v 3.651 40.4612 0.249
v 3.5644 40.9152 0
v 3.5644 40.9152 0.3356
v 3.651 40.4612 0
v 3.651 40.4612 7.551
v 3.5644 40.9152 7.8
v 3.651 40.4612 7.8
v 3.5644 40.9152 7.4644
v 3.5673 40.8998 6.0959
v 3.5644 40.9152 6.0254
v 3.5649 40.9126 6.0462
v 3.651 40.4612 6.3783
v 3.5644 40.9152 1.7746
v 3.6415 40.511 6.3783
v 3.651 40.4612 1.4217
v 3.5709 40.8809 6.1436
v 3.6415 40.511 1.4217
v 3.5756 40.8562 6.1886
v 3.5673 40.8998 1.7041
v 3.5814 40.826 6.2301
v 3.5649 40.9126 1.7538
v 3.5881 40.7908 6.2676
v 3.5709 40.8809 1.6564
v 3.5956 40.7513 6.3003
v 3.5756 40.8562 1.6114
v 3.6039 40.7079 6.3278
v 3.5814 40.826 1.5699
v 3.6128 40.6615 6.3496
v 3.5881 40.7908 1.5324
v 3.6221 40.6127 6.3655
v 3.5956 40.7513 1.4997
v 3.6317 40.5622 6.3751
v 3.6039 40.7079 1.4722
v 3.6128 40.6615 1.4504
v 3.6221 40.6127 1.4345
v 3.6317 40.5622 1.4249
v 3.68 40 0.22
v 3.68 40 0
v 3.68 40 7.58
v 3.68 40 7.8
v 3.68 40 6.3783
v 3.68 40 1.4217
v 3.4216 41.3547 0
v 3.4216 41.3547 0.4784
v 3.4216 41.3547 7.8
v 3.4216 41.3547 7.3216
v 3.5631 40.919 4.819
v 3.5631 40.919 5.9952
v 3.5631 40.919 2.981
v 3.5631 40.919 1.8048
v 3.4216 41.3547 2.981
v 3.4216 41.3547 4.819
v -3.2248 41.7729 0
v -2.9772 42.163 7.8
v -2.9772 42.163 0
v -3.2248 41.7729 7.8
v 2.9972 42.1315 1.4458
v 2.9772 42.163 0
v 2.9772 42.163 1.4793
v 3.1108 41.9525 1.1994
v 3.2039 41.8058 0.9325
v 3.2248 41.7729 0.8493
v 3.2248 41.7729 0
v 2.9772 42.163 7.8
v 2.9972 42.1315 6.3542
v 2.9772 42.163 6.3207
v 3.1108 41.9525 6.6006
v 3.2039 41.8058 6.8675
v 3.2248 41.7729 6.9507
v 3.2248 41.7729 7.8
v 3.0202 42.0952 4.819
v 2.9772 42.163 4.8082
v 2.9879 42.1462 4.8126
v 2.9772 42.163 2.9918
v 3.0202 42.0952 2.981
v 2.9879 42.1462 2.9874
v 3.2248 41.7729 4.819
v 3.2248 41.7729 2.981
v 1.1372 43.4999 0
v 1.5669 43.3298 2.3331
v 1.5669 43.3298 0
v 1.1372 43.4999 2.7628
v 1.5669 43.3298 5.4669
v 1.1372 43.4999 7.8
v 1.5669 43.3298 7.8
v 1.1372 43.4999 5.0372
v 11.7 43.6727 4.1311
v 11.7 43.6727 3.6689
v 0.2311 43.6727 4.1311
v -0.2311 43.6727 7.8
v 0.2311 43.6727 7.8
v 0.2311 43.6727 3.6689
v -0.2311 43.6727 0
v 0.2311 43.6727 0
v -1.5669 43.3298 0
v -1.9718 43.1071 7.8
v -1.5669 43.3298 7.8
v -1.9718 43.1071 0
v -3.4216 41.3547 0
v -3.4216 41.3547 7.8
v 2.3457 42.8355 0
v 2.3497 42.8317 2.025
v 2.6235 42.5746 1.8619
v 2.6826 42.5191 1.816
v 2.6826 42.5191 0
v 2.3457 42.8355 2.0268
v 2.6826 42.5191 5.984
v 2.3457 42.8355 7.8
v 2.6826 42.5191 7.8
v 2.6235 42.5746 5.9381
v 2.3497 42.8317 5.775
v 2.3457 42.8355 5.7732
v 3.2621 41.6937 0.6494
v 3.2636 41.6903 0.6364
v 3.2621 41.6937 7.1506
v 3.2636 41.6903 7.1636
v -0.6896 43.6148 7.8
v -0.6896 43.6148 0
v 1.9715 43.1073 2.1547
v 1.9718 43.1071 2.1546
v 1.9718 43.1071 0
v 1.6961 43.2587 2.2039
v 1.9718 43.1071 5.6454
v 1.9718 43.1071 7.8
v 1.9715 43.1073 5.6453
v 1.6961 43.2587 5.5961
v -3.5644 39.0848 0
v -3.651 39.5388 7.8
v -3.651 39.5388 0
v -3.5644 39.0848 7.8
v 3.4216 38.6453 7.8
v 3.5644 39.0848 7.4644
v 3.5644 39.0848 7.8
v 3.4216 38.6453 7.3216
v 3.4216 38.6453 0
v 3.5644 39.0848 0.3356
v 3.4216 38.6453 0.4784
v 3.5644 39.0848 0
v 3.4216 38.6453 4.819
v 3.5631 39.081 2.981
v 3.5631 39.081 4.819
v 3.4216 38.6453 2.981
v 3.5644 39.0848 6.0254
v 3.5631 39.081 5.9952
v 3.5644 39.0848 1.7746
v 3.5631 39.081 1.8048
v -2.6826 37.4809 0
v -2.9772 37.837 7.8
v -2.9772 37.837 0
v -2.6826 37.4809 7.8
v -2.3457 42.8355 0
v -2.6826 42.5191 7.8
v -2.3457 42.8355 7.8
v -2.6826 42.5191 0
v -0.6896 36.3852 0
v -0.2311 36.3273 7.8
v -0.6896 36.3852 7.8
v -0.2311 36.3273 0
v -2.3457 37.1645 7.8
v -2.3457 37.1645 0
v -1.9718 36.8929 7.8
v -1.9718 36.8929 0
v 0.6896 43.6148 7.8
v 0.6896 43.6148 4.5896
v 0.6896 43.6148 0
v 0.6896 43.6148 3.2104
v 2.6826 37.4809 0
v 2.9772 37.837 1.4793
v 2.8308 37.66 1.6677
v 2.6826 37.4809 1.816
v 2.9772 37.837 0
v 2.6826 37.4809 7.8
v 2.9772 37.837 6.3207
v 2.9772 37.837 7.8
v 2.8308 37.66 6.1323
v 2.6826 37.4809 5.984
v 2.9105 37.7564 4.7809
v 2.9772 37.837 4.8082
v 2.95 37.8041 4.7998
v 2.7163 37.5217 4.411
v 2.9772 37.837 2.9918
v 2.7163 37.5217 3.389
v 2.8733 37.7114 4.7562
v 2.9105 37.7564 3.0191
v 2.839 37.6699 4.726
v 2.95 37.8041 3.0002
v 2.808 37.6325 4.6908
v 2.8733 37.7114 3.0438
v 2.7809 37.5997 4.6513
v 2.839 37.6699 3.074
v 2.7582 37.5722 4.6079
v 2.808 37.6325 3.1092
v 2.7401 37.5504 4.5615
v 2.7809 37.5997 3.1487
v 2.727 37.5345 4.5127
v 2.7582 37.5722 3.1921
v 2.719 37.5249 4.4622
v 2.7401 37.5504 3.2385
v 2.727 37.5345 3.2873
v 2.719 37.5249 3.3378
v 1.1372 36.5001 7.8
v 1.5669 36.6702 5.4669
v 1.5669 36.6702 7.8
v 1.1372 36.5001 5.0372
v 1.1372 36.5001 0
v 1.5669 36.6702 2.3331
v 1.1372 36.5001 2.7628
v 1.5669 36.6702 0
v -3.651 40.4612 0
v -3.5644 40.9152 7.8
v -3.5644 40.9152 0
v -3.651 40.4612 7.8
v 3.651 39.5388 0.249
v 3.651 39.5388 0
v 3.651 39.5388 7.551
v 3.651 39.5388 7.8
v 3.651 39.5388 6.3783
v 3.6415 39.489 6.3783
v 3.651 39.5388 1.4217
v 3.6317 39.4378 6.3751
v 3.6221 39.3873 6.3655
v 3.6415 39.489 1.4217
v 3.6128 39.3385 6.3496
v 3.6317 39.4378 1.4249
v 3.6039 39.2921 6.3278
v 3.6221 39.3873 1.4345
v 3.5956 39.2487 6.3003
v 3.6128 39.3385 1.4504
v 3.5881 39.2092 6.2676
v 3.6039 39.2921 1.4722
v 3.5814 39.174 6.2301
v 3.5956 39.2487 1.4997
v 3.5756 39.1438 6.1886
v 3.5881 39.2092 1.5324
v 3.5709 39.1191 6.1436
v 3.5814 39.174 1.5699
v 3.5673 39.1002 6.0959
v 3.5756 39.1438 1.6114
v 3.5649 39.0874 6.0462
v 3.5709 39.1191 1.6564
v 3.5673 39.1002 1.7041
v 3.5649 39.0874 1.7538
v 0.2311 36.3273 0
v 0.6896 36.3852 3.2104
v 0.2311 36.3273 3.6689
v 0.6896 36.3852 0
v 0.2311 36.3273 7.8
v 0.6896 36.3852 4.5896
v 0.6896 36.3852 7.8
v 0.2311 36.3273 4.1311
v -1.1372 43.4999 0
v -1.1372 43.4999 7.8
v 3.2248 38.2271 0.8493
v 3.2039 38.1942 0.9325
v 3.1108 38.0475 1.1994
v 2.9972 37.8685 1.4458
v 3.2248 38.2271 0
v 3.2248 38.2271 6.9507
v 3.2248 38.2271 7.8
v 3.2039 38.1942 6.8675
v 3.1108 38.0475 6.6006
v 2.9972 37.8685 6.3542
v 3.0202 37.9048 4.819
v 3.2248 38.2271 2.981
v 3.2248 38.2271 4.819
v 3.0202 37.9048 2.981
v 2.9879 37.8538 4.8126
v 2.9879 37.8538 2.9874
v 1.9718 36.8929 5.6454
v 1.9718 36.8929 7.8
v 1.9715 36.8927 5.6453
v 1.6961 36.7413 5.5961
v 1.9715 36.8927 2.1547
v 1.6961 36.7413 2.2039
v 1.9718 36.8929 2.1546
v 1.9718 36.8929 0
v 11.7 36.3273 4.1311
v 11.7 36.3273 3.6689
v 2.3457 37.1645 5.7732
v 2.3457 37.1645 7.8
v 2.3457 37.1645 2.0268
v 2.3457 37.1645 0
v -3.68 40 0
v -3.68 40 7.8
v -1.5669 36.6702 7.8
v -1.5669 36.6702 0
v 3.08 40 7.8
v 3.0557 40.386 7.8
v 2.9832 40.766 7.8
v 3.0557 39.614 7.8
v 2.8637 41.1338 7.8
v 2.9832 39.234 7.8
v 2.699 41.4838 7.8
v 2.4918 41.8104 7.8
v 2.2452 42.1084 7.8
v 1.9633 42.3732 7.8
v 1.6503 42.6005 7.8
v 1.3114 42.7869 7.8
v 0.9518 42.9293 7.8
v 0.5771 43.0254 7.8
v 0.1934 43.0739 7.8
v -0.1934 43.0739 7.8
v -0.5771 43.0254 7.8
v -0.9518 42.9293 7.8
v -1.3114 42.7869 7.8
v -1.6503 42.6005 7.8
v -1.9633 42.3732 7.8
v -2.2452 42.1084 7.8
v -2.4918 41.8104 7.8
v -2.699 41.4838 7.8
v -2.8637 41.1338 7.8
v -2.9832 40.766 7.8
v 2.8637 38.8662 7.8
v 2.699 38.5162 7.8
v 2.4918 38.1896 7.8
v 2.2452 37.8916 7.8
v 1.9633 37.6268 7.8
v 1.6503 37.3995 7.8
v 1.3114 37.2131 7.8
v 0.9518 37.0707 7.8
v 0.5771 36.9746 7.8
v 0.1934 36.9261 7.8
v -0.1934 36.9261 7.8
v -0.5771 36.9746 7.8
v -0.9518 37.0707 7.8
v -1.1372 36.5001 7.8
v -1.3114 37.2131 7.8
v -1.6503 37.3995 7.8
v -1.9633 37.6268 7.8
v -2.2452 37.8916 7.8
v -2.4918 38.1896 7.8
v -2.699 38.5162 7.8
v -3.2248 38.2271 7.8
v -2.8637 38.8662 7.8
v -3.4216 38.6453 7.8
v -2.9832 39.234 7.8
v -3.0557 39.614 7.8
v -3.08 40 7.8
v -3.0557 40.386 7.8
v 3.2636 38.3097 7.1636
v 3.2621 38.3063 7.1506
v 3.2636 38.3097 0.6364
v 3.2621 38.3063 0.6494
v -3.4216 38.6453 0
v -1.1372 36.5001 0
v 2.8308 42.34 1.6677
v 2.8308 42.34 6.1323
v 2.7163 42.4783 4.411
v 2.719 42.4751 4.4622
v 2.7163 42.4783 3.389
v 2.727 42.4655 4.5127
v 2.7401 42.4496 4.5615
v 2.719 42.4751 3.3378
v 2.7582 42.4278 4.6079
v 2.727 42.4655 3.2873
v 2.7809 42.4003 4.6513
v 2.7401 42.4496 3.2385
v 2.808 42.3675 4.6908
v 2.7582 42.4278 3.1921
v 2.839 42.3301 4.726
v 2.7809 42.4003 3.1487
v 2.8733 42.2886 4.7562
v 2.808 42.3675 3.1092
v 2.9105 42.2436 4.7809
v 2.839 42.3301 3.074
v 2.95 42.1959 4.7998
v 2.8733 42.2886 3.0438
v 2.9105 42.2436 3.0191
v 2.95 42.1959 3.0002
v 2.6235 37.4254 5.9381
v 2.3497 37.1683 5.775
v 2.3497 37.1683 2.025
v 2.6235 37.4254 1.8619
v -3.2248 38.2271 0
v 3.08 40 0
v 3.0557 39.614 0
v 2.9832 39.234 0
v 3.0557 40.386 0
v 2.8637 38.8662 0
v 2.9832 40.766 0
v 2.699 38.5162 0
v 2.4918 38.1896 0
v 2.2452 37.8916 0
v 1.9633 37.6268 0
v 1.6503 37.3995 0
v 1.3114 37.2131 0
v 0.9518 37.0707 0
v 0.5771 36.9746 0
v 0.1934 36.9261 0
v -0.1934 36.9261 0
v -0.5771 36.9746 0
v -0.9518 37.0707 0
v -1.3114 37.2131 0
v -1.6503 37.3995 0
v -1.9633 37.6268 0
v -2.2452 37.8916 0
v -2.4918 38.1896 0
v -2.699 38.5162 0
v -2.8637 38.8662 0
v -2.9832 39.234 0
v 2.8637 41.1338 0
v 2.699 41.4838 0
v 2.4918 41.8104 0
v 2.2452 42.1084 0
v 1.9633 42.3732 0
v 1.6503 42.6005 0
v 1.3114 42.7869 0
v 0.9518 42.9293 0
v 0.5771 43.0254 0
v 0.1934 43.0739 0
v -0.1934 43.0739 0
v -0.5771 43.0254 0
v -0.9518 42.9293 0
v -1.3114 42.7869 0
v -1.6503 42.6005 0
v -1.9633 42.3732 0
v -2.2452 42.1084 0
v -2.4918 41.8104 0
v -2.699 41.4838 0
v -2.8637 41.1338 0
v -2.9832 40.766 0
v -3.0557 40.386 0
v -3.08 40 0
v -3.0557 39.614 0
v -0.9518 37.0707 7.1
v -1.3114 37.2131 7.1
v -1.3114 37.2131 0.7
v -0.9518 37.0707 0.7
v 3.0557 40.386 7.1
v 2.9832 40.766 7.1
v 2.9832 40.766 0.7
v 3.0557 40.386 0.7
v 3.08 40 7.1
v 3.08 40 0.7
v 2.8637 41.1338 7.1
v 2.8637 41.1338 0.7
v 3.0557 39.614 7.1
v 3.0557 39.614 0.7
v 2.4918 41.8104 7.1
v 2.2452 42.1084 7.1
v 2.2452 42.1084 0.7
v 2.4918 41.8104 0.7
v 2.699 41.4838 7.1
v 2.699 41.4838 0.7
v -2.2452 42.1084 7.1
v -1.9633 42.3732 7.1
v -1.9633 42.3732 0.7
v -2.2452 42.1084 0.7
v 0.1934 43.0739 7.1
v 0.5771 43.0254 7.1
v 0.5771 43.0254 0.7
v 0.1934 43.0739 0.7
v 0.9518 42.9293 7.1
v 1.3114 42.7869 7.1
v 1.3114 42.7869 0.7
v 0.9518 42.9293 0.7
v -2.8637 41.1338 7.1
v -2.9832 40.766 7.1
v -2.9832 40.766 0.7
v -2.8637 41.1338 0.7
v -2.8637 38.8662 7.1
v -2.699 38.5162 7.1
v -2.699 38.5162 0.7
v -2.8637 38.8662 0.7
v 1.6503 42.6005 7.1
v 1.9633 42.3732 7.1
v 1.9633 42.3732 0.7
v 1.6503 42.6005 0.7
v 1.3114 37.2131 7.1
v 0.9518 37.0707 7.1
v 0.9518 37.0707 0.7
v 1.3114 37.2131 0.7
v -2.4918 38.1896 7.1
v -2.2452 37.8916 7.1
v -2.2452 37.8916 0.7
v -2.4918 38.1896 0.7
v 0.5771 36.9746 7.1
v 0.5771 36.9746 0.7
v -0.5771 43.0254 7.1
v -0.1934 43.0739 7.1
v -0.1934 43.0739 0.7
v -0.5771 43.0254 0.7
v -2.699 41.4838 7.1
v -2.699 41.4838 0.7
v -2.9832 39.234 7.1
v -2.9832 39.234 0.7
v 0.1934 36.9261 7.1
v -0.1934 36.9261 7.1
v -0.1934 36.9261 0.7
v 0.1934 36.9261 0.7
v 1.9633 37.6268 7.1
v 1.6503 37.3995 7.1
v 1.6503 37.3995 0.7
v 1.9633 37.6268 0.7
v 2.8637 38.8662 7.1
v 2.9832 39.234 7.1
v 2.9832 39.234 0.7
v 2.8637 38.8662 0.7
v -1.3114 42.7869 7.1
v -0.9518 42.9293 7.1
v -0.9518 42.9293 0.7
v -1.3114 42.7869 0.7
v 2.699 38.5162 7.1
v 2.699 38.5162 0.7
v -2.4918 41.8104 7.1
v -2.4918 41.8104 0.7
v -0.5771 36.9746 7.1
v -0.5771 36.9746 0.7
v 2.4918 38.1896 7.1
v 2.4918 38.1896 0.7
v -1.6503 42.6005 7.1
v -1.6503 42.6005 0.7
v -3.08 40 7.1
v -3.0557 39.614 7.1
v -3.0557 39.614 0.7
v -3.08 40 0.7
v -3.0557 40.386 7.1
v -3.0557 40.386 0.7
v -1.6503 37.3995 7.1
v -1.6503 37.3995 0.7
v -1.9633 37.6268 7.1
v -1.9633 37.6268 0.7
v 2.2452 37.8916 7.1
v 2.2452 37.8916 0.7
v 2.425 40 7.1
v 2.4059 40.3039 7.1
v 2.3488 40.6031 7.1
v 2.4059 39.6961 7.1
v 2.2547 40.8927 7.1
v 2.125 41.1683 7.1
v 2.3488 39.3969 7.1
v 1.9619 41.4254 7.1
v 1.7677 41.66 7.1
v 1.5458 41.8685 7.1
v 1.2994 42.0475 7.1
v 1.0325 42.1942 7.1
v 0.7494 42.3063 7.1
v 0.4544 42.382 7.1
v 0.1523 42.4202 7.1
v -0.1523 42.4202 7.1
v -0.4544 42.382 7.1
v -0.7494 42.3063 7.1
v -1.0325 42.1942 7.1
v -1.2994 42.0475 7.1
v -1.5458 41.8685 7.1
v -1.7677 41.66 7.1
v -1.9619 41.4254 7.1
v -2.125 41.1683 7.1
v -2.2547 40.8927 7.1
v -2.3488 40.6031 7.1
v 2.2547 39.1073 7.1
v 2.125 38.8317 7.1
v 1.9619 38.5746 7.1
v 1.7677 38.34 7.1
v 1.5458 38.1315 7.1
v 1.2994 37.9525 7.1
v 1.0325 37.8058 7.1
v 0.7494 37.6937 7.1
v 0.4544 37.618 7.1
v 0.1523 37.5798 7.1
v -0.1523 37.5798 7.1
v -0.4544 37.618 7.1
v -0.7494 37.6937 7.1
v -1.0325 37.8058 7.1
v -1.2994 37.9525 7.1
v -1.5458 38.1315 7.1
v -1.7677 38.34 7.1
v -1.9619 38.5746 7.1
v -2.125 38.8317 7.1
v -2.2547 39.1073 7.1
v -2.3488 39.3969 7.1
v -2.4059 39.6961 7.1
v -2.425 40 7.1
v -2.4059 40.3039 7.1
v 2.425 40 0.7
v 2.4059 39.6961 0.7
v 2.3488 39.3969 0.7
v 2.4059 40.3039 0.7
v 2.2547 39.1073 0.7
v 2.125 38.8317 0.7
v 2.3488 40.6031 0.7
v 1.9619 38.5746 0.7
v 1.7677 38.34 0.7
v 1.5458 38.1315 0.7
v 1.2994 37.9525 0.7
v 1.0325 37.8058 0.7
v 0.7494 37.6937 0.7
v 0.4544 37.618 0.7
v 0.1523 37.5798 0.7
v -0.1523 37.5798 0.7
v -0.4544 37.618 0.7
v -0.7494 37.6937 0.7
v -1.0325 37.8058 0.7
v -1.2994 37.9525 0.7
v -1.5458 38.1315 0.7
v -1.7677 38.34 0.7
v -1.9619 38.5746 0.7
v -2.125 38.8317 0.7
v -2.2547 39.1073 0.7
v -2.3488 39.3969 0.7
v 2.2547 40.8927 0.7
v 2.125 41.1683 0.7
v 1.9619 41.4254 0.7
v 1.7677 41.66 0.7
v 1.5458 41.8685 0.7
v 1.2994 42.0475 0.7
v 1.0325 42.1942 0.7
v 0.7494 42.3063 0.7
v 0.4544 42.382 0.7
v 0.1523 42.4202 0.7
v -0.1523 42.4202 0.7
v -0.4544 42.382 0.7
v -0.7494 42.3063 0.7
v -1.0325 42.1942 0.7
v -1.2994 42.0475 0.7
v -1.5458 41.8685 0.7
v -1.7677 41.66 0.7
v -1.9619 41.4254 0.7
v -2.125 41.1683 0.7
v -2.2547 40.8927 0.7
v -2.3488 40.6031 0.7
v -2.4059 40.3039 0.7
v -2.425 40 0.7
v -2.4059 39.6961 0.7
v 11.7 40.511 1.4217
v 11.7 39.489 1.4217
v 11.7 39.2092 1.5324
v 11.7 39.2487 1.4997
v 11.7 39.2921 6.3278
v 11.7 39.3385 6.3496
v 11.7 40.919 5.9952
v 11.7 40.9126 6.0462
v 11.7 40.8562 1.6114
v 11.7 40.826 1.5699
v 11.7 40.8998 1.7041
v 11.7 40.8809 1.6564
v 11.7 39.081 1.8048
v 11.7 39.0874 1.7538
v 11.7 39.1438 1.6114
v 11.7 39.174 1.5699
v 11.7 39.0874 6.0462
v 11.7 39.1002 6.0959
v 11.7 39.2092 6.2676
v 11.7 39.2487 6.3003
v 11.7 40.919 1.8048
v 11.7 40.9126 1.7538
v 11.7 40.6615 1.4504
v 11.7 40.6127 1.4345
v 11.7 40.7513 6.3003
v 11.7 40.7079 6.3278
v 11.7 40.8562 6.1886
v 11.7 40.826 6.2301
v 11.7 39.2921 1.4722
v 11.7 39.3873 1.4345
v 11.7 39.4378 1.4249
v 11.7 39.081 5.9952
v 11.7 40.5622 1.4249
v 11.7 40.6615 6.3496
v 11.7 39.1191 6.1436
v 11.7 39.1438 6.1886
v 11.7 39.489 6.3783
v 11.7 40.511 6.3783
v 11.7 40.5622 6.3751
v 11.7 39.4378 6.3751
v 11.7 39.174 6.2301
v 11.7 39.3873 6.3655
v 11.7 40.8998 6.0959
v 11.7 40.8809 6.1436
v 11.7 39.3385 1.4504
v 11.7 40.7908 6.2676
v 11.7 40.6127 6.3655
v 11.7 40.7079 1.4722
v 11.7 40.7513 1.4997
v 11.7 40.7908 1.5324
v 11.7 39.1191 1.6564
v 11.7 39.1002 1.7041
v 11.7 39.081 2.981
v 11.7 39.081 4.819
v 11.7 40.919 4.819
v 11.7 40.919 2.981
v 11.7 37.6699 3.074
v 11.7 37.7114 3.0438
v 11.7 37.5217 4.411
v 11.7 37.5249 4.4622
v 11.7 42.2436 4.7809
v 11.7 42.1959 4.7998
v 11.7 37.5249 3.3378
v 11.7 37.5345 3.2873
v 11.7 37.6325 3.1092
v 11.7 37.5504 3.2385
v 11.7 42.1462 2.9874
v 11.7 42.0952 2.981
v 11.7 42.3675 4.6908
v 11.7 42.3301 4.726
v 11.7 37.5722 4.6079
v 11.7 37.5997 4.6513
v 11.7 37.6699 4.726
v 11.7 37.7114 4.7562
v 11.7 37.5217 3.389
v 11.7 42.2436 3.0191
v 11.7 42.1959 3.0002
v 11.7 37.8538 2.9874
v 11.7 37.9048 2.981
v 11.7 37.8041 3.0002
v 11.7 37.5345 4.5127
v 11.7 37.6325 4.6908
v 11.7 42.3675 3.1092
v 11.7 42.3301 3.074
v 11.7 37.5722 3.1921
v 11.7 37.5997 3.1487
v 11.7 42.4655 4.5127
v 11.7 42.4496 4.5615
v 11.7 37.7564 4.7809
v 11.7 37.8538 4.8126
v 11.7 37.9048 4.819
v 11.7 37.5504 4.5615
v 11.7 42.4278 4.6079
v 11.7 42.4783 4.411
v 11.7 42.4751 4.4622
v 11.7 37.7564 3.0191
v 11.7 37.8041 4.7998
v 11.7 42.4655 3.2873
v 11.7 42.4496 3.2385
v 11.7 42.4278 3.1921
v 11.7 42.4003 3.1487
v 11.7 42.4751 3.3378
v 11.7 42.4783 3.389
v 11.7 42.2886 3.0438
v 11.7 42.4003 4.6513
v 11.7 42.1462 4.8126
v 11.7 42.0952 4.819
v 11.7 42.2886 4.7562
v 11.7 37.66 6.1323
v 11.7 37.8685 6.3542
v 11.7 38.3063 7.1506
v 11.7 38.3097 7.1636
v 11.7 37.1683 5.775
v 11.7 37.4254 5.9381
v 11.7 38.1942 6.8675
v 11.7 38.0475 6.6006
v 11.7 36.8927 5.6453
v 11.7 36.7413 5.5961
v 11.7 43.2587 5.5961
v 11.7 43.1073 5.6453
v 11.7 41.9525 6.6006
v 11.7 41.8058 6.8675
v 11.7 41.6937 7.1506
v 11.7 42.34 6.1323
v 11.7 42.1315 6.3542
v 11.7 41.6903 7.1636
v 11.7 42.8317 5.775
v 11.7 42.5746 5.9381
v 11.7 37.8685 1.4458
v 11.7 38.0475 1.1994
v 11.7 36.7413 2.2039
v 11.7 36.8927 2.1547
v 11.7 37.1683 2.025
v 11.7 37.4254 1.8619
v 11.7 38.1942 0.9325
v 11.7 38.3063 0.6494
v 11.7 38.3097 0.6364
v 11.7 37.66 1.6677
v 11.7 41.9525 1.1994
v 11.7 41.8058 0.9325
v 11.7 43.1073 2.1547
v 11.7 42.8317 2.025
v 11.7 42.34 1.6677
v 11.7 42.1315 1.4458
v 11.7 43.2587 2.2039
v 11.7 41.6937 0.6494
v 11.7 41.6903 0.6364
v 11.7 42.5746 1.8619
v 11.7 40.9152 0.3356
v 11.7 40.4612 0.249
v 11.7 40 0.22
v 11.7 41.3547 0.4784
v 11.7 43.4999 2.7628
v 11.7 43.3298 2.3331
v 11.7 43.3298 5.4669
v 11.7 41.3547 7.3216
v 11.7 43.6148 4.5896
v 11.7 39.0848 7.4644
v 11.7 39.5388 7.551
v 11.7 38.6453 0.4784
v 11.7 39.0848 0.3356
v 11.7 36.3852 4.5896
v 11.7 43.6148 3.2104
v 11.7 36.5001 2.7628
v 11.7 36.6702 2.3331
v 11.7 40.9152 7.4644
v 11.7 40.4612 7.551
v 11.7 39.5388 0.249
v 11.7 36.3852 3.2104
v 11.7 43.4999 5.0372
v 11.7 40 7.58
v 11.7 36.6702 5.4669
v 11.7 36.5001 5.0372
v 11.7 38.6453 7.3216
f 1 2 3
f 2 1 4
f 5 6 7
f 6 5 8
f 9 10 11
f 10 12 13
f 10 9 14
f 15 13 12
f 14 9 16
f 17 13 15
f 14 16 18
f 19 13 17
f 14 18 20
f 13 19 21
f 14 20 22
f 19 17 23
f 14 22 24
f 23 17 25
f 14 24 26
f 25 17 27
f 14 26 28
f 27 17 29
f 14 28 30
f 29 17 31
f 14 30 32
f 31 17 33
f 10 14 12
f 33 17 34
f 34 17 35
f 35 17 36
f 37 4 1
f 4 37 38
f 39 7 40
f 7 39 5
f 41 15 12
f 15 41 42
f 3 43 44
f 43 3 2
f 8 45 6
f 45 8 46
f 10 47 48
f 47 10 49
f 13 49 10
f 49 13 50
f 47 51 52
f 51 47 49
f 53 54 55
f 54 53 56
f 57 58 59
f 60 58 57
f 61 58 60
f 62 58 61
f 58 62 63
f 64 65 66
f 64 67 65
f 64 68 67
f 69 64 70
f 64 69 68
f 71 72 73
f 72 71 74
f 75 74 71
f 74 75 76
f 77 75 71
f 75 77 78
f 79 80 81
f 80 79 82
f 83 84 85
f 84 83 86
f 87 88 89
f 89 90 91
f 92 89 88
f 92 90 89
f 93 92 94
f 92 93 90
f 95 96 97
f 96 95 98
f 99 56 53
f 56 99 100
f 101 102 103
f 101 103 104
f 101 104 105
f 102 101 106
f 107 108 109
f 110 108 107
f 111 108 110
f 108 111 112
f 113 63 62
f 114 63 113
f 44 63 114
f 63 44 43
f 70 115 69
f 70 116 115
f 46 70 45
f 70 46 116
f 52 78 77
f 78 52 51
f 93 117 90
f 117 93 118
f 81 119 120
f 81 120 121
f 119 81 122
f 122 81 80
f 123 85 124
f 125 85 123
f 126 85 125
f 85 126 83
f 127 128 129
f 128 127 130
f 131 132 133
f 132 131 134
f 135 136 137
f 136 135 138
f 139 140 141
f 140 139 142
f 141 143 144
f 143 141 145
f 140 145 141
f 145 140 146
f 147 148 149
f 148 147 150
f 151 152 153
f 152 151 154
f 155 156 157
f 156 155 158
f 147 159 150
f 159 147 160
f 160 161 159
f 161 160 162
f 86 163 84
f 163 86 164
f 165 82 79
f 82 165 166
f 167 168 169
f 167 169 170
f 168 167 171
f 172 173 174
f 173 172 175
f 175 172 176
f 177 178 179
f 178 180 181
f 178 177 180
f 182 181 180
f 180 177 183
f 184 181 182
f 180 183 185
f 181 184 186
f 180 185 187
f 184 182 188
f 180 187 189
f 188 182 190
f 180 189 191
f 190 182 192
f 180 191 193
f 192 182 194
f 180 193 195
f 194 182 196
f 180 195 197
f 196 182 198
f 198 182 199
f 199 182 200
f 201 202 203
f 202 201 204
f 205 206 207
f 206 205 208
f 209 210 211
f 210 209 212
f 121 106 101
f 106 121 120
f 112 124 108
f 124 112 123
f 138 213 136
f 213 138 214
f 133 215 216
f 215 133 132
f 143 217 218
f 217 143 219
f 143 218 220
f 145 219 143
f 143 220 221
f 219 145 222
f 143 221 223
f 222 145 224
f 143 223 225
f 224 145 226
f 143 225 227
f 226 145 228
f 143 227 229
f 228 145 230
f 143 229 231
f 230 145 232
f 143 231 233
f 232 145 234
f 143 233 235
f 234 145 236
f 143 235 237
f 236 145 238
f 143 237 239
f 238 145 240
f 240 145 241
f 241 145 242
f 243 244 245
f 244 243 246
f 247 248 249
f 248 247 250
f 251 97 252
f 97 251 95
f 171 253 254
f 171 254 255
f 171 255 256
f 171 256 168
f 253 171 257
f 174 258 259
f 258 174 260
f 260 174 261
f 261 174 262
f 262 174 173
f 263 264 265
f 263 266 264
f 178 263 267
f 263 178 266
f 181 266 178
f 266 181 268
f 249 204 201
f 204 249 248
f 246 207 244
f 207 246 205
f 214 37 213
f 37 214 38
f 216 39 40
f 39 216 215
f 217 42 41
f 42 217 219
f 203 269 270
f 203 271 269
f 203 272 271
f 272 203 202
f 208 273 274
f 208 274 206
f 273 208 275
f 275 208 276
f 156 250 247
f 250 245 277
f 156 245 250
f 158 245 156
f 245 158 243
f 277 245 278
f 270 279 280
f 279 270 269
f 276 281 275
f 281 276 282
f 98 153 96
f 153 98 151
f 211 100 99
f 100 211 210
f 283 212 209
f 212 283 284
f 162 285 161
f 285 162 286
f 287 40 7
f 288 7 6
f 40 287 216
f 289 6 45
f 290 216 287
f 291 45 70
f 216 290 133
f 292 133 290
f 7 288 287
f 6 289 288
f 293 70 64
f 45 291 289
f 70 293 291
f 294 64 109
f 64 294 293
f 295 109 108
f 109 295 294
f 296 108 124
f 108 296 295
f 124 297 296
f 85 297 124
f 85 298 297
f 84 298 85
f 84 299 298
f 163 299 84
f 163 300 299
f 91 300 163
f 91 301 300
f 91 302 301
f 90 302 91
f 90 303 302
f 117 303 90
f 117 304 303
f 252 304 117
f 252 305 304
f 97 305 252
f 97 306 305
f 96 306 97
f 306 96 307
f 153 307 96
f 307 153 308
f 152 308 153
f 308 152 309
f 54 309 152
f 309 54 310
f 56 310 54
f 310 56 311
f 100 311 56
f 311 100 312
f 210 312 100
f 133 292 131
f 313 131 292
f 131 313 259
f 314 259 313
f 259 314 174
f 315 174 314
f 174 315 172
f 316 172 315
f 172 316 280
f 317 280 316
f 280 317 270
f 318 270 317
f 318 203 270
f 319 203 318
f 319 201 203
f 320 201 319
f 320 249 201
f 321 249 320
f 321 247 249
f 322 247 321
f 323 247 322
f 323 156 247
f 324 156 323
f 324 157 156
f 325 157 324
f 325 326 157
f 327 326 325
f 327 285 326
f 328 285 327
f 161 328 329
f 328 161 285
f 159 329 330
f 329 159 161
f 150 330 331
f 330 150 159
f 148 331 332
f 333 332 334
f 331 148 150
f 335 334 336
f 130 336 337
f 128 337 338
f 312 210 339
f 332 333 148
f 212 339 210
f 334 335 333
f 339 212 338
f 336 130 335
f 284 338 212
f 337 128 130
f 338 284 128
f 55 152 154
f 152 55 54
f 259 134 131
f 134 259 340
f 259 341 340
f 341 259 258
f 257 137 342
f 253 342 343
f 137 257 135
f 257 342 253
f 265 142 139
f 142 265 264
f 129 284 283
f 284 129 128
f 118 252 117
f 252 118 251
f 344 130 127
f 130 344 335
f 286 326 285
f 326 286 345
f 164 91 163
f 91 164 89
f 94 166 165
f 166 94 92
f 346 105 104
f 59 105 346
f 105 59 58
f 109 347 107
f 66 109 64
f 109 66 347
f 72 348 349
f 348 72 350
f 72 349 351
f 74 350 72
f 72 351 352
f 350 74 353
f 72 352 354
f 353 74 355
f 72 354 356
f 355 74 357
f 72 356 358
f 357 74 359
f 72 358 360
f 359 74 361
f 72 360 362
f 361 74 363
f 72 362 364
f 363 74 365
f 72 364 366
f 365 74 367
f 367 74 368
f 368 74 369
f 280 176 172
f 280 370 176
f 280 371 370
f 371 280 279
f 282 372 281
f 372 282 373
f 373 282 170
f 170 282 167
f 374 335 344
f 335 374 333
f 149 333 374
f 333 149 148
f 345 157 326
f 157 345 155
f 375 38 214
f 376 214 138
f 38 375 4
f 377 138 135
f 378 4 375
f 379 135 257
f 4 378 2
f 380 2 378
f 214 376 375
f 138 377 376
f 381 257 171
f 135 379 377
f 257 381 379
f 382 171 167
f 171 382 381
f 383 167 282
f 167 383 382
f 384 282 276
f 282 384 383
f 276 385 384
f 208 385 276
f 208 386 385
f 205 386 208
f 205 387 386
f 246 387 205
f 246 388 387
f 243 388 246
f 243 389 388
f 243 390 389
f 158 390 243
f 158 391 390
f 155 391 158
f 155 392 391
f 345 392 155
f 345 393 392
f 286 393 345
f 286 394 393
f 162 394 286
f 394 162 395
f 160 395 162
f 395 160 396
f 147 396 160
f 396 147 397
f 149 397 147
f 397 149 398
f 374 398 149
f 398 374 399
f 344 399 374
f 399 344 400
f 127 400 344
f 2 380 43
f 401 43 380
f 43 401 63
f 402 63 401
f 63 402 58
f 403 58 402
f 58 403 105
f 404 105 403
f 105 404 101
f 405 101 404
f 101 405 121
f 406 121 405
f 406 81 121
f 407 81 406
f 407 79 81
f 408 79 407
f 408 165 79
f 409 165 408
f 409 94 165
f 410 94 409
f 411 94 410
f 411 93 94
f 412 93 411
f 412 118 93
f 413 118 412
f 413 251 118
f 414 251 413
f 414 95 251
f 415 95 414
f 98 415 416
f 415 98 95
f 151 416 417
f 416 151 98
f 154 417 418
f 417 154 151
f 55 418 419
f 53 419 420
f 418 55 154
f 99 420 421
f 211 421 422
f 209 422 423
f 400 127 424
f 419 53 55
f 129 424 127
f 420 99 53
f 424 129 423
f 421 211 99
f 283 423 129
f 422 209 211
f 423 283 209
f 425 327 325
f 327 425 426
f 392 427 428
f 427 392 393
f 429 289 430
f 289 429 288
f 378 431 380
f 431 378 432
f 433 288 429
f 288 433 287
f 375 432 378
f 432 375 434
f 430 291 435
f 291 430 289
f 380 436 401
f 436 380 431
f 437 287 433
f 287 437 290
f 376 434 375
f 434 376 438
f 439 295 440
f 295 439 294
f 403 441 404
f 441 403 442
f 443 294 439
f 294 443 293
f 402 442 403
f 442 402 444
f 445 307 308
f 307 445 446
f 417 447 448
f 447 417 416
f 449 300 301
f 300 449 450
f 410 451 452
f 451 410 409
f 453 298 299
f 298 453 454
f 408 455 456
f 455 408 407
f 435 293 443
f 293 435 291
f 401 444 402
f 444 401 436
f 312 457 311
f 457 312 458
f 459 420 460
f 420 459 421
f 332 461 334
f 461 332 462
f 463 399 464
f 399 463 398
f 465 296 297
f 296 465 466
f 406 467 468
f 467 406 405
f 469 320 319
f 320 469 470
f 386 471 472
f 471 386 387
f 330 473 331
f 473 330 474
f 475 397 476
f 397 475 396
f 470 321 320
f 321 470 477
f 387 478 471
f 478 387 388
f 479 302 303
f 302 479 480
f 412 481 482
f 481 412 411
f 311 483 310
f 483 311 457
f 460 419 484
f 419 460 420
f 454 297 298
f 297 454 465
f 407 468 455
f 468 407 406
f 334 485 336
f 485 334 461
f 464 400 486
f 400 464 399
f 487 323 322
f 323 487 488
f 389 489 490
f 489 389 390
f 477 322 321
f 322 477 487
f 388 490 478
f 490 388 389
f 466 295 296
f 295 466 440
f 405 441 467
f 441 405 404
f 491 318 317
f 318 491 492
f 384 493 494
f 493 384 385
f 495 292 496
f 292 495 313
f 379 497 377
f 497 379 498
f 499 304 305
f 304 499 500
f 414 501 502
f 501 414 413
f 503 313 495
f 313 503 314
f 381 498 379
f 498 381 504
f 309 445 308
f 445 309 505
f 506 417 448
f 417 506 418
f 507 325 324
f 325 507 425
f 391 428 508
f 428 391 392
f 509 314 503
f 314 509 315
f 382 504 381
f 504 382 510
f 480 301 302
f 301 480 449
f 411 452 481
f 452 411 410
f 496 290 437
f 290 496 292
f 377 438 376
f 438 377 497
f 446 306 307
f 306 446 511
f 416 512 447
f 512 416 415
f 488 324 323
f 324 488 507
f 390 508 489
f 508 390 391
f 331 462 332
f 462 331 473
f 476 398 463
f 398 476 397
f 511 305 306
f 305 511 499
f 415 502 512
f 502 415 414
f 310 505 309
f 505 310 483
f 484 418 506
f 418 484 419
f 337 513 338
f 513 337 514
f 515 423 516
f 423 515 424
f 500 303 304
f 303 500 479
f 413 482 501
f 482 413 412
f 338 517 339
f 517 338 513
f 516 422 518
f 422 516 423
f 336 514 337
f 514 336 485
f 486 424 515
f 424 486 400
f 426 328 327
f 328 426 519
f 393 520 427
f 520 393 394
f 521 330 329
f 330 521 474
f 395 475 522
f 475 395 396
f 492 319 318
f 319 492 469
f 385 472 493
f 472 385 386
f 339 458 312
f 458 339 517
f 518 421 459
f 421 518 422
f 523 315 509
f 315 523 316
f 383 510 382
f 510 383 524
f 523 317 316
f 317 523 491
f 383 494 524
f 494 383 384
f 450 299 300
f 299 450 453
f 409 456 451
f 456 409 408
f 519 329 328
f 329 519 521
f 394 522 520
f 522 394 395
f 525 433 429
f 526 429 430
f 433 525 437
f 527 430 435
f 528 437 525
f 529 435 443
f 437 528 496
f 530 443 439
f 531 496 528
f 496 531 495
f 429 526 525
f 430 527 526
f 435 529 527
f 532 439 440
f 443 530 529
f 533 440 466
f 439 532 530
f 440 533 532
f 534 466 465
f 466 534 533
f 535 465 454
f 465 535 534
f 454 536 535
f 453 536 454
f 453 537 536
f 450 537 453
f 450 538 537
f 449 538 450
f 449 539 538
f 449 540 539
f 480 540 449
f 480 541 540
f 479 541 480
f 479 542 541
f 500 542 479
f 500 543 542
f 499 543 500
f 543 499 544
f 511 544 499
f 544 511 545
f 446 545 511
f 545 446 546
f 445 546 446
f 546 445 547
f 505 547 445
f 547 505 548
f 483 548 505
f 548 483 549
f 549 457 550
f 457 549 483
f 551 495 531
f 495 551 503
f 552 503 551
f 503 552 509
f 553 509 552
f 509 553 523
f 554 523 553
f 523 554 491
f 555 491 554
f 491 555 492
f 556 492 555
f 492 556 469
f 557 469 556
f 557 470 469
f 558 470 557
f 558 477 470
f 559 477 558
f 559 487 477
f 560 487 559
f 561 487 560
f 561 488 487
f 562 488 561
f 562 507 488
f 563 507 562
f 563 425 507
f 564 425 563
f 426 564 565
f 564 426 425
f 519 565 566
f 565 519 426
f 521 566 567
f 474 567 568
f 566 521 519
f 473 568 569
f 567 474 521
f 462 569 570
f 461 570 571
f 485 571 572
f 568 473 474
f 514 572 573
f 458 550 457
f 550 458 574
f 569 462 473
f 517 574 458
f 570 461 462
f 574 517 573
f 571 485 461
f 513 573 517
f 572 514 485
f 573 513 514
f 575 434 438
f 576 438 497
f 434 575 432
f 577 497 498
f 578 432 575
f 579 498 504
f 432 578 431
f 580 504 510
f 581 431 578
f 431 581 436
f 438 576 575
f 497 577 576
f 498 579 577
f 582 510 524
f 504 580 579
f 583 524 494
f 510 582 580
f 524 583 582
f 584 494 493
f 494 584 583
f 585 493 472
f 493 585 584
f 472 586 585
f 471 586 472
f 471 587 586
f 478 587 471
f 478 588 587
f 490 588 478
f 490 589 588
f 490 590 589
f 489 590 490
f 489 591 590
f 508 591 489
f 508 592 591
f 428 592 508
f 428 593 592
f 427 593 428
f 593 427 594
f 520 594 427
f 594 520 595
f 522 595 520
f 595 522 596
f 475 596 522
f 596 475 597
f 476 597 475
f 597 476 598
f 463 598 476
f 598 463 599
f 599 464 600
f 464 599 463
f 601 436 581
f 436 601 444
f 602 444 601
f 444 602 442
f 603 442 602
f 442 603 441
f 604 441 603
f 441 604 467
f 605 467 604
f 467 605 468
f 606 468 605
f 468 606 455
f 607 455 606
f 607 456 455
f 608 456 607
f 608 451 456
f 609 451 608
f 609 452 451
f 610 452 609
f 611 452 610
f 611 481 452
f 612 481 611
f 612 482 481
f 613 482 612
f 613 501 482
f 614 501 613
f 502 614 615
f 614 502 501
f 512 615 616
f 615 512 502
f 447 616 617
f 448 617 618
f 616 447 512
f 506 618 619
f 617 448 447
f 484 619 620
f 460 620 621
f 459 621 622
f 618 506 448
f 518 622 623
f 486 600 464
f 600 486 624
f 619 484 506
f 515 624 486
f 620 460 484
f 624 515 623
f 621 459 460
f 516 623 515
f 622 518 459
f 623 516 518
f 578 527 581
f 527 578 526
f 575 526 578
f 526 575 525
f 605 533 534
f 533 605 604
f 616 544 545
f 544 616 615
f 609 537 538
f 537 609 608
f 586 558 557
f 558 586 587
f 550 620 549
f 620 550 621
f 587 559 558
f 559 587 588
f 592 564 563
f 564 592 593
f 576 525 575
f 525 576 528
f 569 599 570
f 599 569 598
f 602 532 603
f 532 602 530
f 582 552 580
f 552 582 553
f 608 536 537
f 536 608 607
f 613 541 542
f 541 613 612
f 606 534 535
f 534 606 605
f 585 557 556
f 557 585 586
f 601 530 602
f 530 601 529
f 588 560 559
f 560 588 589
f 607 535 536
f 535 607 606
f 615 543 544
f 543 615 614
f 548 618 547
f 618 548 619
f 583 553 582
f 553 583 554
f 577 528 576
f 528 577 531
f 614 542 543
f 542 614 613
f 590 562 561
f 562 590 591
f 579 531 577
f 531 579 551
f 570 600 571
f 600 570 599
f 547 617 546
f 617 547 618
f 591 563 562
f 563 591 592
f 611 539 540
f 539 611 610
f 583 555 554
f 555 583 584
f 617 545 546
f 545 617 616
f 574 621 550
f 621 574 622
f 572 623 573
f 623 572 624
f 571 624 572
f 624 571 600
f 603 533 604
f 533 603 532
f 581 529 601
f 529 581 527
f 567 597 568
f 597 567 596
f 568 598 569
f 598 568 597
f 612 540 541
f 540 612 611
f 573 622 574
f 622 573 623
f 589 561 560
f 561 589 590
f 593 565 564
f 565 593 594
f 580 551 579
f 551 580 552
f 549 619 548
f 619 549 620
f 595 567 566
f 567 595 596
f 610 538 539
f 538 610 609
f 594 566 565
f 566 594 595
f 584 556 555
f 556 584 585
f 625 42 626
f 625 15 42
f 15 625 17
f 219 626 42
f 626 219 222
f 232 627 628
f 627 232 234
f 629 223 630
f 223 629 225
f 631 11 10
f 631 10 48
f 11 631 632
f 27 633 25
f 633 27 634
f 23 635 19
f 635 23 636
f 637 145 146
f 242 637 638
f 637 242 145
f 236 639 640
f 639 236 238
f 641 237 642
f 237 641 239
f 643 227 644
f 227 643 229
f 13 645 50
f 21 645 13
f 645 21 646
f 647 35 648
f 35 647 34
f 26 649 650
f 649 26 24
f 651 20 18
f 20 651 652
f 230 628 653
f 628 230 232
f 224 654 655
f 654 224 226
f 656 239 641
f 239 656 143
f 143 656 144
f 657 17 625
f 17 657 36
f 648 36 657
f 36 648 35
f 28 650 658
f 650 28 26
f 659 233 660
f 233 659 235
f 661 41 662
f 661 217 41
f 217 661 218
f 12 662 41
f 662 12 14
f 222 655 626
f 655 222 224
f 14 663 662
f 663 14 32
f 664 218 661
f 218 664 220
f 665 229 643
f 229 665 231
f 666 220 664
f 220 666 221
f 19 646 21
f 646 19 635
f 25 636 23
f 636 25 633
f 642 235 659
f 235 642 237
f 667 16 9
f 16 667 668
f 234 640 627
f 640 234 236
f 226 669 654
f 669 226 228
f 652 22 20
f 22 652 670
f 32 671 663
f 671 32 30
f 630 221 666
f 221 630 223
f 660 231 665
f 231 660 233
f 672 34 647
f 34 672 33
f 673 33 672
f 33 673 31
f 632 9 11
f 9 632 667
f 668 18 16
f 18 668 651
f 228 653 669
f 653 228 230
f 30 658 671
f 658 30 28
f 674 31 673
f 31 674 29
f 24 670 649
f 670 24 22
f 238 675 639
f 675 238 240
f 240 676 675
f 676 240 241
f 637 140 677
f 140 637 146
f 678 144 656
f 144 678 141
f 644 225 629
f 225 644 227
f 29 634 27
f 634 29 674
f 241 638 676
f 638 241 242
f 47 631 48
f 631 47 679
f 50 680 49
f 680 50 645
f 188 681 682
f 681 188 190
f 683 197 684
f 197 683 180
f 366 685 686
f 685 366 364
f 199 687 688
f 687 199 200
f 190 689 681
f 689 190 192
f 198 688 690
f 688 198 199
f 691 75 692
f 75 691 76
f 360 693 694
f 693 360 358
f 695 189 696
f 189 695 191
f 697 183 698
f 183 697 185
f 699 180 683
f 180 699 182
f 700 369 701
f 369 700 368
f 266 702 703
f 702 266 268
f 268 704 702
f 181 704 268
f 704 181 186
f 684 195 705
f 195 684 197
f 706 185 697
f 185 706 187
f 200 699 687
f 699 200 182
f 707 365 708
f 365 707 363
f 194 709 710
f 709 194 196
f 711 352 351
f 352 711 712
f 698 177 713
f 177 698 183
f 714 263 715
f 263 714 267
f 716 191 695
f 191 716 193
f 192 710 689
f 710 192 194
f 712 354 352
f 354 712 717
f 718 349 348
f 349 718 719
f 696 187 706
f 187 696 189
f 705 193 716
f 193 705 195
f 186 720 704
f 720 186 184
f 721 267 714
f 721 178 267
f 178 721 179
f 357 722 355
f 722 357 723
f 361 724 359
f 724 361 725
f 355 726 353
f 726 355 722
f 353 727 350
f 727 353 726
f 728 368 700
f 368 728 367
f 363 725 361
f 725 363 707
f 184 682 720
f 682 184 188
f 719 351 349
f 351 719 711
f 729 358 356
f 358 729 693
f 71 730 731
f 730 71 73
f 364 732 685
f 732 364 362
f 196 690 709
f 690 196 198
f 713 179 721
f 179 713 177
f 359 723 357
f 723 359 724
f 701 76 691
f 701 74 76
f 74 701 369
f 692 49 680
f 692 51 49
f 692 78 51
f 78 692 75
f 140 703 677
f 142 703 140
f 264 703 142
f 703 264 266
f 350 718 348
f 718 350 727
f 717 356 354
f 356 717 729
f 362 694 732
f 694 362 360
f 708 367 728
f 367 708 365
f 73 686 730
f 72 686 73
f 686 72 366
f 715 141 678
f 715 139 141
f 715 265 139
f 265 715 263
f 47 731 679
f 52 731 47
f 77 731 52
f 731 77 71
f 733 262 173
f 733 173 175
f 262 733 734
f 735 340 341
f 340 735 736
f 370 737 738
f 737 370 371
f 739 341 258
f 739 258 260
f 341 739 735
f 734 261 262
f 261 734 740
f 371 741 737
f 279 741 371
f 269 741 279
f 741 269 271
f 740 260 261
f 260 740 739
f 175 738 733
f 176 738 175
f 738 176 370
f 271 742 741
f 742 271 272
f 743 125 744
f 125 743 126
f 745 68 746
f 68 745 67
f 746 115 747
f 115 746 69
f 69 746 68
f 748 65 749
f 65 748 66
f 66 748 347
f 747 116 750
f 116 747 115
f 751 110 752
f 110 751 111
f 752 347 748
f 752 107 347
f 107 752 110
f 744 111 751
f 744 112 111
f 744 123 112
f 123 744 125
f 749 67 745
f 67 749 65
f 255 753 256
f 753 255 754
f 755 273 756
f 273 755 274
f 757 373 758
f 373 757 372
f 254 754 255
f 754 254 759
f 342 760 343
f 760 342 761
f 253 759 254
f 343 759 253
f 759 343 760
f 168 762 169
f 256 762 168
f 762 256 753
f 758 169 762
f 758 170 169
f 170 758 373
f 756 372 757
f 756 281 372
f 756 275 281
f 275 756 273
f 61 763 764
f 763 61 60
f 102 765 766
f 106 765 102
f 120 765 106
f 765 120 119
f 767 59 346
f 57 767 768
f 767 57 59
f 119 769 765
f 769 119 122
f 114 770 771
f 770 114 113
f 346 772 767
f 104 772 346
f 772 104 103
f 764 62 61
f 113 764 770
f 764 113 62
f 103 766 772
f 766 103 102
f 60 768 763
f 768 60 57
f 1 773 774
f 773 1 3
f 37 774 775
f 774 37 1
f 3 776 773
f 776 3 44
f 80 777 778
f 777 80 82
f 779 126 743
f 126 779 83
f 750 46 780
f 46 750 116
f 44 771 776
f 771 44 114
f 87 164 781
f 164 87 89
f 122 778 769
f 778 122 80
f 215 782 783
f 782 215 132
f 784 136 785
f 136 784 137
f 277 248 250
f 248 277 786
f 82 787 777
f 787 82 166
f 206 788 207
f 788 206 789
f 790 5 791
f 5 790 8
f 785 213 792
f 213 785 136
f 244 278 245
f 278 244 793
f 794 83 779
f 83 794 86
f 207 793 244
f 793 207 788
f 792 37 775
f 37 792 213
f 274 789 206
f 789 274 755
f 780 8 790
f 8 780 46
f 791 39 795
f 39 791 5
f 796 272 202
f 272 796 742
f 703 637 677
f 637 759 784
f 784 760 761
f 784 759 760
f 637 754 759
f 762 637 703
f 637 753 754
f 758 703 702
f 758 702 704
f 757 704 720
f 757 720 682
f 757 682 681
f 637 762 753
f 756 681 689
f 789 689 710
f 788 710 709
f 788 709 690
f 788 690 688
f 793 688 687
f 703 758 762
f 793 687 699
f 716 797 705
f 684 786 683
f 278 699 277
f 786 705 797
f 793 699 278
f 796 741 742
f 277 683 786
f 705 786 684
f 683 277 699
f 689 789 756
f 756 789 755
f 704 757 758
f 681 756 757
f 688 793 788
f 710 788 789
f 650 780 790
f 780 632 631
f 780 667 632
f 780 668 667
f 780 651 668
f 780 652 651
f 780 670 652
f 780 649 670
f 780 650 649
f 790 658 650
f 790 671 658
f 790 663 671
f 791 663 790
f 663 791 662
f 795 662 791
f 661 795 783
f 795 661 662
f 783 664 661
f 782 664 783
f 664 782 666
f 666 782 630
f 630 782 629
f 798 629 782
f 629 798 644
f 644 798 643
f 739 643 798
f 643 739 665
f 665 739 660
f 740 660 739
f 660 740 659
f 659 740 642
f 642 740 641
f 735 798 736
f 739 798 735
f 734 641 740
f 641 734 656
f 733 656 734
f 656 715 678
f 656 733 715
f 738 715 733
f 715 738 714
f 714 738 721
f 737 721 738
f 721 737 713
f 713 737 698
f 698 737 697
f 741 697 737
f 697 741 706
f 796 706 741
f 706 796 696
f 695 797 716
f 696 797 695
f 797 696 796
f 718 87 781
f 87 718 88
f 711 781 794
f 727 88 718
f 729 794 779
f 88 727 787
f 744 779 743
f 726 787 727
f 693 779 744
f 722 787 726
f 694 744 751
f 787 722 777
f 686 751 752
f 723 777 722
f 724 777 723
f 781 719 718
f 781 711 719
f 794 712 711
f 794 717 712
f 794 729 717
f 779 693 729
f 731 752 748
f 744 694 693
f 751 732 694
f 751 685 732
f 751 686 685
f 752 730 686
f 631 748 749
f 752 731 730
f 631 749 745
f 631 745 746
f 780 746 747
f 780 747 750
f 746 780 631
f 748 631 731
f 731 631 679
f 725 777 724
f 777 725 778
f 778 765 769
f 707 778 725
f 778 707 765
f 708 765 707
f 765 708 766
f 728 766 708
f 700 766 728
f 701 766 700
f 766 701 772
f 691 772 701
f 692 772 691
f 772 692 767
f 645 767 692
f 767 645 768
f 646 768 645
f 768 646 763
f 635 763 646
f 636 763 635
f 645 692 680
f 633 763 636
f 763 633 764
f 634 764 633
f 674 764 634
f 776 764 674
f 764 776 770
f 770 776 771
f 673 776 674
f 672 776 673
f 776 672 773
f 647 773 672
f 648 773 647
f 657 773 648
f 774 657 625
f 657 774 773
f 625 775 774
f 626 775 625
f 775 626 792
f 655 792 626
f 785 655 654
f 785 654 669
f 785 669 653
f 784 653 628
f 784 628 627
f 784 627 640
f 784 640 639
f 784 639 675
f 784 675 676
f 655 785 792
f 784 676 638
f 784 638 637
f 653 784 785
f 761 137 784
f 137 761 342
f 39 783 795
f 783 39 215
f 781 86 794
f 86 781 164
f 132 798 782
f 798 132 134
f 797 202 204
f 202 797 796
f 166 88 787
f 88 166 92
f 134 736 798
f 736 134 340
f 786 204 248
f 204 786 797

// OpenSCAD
/**
 * LEGO and Technic are trademarks of the LEGO Group.
 *
 * For standard LEGO-compatible bricks, see LEGO.scad. This module
 * is specifically for parts without studs, like gears and axles.
 *
 * Copyright (c) 2025 Christopher Finke (cfinke@gmail.com)
 *
 * Permission is hereby granted, free of charge, to any person obtaining
 * a copy of this software and associated documentation files (the
 * "Software"), to deal in the Software without restriction, including
 * without limitation the rights to use, copy, modify, merge, publish,
 * distribute, sublicense, and/or sell copies of the Software, and to
 * permit persons to whom the Software is furnished to do so, subject to
 * the following conditions:
 *
 * The above copyright notice and this permission notice shall be
 * included in all copies or substantial portions of the Software.
 *
 * THE SOFTWARE IS PROVIDED "AS IS", WITHOUT WARRANTY OF ANY KIND,
 * EXPRESS OR IMPLIED, INCLUDING BUT NOT LIMITED TO THE WARRANTIES OF
 * MERCHANTABILITY, FITNESS FOR A PARTICULAR PURPOSE AND
 * NONINFRINGEMENT. IN NO EVENT SHALL THE AUTHORS OR COPYRIGHT HOLDERS BE
 * LIABLE FOR ANY CLAIM, DAMAGES OR OTHER LIABILITY, WHETHER IN AN ACTION
 * OF CONTRACT, TORT OR OTHERWISE, ARISING FROM, OUT OF OR IN CONNECTION
 * WITH THE SOFTWARE OR THE USE OR OTHER DEALINGS IN THE SOFTWARE.
 */

include <Technic.scad>;

color( "orange" ) translate( [ 0, 40, 0 ] ) technic_connector_hub( spoke_angles = [ 0 ], spoke_lengths = [ 1 ], spoke_heights = [ 1 ], spoke_types = [ "axle connector" ] );
